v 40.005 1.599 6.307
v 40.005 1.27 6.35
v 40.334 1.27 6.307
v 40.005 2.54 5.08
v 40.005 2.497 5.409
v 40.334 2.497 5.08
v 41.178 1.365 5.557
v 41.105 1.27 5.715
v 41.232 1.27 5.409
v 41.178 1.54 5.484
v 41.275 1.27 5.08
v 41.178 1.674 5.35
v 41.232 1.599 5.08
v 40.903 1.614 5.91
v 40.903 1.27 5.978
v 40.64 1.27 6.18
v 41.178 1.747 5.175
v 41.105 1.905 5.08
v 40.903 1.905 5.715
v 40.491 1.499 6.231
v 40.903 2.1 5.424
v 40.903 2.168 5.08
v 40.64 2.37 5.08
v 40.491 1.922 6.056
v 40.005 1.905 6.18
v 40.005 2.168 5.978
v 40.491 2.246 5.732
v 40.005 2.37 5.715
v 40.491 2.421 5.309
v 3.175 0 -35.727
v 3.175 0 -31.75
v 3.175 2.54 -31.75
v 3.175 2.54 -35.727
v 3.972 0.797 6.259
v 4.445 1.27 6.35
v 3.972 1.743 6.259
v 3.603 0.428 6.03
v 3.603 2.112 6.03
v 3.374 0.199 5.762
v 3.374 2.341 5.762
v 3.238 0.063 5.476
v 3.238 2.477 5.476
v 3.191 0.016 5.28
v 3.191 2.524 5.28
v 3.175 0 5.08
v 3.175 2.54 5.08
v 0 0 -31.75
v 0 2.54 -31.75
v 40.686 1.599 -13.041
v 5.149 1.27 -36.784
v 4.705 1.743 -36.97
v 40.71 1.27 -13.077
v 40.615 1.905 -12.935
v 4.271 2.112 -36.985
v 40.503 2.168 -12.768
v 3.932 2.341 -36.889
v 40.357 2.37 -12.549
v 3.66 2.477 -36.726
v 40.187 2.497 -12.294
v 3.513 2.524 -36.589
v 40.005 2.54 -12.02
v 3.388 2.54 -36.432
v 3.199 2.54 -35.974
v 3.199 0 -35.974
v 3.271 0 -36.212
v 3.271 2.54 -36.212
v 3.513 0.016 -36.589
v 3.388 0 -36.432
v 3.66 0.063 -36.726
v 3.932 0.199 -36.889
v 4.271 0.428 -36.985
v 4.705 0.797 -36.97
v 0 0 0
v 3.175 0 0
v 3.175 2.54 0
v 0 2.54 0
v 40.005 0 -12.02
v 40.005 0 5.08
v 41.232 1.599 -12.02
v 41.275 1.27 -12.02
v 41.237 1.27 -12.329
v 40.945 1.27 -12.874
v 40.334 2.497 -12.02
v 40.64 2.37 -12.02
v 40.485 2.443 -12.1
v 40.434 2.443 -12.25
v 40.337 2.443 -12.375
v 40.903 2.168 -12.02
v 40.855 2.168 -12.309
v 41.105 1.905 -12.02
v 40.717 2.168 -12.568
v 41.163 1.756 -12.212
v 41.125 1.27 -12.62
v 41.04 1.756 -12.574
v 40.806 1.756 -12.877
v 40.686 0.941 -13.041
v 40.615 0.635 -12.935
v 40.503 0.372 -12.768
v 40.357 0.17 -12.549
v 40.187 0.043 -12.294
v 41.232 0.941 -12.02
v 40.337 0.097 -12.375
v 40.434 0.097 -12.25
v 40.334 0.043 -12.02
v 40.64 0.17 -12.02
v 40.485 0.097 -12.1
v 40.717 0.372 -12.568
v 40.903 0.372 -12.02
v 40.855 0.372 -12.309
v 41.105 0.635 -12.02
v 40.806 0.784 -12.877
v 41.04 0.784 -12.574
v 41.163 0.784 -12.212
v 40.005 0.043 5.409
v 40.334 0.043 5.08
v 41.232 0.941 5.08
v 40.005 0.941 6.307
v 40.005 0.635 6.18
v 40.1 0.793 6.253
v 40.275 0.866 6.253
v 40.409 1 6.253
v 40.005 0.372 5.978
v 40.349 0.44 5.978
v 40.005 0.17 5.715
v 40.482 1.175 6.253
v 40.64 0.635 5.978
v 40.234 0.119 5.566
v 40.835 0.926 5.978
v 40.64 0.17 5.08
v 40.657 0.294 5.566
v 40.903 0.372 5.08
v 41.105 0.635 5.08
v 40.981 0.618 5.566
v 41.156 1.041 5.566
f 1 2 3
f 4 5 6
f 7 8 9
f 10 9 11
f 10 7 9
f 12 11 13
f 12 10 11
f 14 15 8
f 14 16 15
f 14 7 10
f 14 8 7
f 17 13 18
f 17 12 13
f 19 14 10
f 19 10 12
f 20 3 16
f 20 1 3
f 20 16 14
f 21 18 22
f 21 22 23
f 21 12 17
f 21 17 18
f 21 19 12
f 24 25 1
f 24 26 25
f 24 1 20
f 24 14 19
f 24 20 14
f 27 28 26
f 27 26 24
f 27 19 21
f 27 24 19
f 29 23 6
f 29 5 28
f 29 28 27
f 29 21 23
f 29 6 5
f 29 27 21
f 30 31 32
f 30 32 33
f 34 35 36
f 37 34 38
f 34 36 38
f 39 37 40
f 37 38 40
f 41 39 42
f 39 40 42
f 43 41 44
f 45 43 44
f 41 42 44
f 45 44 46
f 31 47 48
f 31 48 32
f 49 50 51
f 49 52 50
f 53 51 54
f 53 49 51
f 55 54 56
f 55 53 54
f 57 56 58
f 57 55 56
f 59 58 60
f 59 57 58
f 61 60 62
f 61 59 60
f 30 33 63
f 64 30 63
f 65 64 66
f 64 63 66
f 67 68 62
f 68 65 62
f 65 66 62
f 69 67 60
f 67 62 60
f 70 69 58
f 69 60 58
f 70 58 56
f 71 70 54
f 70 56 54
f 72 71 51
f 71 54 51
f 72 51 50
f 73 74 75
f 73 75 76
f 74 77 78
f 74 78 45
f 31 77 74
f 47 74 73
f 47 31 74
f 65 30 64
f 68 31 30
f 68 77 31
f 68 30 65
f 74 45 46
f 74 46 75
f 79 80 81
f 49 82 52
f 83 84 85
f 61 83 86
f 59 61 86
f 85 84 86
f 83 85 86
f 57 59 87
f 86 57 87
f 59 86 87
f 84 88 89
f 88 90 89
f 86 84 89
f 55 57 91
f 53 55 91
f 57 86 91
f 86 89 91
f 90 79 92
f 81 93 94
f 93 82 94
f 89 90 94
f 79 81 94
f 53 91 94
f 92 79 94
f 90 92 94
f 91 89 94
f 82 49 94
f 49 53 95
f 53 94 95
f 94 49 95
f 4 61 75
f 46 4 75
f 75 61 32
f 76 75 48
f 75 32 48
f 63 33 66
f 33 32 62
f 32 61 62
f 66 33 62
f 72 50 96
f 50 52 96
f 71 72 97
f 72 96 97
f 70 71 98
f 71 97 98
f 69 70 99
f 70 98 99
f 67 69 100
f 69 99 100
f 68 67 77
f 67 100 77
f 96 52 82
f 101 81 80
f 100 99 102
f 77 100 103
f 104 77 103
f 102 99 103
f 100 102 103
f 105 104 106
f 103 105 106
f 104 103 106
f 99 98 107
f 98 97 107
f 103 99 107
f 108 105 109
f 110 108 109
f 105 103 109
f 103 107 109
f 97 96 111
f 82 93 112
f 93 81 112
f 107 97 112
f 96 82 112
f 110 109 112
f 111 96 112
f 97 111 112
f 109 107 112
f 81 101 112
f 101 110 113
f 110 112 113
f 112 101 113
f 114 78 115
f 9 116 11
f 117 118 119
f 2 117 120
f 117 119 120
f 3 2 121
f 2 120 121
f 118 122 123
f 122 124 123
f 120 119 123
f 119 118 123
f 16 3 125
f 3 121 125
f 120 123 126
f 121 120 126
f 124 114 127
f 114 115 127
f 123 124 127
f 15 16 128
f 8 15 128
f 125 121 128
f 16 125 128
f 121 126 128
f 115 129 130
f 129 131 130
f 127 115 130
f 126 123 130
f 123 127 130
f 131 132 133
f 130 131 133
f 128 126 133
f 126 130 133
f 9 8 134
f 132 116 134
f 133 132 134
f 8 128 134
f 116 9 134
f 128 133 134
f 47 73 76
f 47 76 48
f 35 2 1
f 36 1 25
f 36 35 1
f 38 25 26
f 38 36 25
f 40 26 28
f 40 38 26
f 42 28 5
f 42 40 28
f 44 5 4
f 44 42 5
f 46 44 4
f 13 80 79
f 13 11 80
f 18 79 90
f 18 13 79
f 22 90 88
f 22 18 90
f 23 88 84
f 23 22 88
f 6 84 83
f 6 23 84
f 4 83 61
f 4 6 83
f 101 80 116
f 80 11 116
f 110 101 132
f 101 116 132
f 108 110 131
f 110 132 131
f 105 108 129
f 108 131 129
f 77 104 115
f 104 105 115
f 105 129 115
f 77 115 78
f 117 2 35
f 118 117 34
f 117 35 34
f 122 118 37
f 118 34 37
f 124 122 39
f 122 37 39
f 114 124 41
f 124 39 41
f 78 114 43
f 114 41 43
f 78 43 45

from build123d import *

# Parameters (mm, degrees)
BOSS_EXTRUDE1_DEPTH = 2.54
FILLET1_R           = 1.27


with BuildPart() as part:
    # Sketch1 → Boss-Extrude1 (new body)
    with BuildSketch(Plane(origin=(0, 0, 0), x_dir=(1, 0, 0), z_dir=(0, 1, 0))):
        Polygon((0, 0), (0, 31.75), (3.175, 31.75), (3.175, 38.1), (41.275, 12.7), (41.275, -6.35), (3.175, -6.35), (3.175, 0), align=None)
    extrude(amount=BOSS_EXTRUDE1_DEPTH)

    # Fillet1
    fillet1_edges = [part.edges().sort_by_distance(p)[0] for p in [
        (41.275, 0, -3.175),
        (22.225, 0, 6.35),
        (22.225, 2.54, 6.35),
        (3.175, 1.27, -38.1),
        (41.275, 1.27, -12.7),
        (41.275, 1.27, 6.35),
        (3.175, 1.27, 6.35),
        (41.275, 2.54, -3.175),
        (22.225, 2.54, -25.4),
        (22.225, 0, -25.4),
    ]]
    fillet(fillet1_edges, radius=FILLET1_R - 0.0001)  # a hair under: the kernel refuses the full size


solid = part.part
